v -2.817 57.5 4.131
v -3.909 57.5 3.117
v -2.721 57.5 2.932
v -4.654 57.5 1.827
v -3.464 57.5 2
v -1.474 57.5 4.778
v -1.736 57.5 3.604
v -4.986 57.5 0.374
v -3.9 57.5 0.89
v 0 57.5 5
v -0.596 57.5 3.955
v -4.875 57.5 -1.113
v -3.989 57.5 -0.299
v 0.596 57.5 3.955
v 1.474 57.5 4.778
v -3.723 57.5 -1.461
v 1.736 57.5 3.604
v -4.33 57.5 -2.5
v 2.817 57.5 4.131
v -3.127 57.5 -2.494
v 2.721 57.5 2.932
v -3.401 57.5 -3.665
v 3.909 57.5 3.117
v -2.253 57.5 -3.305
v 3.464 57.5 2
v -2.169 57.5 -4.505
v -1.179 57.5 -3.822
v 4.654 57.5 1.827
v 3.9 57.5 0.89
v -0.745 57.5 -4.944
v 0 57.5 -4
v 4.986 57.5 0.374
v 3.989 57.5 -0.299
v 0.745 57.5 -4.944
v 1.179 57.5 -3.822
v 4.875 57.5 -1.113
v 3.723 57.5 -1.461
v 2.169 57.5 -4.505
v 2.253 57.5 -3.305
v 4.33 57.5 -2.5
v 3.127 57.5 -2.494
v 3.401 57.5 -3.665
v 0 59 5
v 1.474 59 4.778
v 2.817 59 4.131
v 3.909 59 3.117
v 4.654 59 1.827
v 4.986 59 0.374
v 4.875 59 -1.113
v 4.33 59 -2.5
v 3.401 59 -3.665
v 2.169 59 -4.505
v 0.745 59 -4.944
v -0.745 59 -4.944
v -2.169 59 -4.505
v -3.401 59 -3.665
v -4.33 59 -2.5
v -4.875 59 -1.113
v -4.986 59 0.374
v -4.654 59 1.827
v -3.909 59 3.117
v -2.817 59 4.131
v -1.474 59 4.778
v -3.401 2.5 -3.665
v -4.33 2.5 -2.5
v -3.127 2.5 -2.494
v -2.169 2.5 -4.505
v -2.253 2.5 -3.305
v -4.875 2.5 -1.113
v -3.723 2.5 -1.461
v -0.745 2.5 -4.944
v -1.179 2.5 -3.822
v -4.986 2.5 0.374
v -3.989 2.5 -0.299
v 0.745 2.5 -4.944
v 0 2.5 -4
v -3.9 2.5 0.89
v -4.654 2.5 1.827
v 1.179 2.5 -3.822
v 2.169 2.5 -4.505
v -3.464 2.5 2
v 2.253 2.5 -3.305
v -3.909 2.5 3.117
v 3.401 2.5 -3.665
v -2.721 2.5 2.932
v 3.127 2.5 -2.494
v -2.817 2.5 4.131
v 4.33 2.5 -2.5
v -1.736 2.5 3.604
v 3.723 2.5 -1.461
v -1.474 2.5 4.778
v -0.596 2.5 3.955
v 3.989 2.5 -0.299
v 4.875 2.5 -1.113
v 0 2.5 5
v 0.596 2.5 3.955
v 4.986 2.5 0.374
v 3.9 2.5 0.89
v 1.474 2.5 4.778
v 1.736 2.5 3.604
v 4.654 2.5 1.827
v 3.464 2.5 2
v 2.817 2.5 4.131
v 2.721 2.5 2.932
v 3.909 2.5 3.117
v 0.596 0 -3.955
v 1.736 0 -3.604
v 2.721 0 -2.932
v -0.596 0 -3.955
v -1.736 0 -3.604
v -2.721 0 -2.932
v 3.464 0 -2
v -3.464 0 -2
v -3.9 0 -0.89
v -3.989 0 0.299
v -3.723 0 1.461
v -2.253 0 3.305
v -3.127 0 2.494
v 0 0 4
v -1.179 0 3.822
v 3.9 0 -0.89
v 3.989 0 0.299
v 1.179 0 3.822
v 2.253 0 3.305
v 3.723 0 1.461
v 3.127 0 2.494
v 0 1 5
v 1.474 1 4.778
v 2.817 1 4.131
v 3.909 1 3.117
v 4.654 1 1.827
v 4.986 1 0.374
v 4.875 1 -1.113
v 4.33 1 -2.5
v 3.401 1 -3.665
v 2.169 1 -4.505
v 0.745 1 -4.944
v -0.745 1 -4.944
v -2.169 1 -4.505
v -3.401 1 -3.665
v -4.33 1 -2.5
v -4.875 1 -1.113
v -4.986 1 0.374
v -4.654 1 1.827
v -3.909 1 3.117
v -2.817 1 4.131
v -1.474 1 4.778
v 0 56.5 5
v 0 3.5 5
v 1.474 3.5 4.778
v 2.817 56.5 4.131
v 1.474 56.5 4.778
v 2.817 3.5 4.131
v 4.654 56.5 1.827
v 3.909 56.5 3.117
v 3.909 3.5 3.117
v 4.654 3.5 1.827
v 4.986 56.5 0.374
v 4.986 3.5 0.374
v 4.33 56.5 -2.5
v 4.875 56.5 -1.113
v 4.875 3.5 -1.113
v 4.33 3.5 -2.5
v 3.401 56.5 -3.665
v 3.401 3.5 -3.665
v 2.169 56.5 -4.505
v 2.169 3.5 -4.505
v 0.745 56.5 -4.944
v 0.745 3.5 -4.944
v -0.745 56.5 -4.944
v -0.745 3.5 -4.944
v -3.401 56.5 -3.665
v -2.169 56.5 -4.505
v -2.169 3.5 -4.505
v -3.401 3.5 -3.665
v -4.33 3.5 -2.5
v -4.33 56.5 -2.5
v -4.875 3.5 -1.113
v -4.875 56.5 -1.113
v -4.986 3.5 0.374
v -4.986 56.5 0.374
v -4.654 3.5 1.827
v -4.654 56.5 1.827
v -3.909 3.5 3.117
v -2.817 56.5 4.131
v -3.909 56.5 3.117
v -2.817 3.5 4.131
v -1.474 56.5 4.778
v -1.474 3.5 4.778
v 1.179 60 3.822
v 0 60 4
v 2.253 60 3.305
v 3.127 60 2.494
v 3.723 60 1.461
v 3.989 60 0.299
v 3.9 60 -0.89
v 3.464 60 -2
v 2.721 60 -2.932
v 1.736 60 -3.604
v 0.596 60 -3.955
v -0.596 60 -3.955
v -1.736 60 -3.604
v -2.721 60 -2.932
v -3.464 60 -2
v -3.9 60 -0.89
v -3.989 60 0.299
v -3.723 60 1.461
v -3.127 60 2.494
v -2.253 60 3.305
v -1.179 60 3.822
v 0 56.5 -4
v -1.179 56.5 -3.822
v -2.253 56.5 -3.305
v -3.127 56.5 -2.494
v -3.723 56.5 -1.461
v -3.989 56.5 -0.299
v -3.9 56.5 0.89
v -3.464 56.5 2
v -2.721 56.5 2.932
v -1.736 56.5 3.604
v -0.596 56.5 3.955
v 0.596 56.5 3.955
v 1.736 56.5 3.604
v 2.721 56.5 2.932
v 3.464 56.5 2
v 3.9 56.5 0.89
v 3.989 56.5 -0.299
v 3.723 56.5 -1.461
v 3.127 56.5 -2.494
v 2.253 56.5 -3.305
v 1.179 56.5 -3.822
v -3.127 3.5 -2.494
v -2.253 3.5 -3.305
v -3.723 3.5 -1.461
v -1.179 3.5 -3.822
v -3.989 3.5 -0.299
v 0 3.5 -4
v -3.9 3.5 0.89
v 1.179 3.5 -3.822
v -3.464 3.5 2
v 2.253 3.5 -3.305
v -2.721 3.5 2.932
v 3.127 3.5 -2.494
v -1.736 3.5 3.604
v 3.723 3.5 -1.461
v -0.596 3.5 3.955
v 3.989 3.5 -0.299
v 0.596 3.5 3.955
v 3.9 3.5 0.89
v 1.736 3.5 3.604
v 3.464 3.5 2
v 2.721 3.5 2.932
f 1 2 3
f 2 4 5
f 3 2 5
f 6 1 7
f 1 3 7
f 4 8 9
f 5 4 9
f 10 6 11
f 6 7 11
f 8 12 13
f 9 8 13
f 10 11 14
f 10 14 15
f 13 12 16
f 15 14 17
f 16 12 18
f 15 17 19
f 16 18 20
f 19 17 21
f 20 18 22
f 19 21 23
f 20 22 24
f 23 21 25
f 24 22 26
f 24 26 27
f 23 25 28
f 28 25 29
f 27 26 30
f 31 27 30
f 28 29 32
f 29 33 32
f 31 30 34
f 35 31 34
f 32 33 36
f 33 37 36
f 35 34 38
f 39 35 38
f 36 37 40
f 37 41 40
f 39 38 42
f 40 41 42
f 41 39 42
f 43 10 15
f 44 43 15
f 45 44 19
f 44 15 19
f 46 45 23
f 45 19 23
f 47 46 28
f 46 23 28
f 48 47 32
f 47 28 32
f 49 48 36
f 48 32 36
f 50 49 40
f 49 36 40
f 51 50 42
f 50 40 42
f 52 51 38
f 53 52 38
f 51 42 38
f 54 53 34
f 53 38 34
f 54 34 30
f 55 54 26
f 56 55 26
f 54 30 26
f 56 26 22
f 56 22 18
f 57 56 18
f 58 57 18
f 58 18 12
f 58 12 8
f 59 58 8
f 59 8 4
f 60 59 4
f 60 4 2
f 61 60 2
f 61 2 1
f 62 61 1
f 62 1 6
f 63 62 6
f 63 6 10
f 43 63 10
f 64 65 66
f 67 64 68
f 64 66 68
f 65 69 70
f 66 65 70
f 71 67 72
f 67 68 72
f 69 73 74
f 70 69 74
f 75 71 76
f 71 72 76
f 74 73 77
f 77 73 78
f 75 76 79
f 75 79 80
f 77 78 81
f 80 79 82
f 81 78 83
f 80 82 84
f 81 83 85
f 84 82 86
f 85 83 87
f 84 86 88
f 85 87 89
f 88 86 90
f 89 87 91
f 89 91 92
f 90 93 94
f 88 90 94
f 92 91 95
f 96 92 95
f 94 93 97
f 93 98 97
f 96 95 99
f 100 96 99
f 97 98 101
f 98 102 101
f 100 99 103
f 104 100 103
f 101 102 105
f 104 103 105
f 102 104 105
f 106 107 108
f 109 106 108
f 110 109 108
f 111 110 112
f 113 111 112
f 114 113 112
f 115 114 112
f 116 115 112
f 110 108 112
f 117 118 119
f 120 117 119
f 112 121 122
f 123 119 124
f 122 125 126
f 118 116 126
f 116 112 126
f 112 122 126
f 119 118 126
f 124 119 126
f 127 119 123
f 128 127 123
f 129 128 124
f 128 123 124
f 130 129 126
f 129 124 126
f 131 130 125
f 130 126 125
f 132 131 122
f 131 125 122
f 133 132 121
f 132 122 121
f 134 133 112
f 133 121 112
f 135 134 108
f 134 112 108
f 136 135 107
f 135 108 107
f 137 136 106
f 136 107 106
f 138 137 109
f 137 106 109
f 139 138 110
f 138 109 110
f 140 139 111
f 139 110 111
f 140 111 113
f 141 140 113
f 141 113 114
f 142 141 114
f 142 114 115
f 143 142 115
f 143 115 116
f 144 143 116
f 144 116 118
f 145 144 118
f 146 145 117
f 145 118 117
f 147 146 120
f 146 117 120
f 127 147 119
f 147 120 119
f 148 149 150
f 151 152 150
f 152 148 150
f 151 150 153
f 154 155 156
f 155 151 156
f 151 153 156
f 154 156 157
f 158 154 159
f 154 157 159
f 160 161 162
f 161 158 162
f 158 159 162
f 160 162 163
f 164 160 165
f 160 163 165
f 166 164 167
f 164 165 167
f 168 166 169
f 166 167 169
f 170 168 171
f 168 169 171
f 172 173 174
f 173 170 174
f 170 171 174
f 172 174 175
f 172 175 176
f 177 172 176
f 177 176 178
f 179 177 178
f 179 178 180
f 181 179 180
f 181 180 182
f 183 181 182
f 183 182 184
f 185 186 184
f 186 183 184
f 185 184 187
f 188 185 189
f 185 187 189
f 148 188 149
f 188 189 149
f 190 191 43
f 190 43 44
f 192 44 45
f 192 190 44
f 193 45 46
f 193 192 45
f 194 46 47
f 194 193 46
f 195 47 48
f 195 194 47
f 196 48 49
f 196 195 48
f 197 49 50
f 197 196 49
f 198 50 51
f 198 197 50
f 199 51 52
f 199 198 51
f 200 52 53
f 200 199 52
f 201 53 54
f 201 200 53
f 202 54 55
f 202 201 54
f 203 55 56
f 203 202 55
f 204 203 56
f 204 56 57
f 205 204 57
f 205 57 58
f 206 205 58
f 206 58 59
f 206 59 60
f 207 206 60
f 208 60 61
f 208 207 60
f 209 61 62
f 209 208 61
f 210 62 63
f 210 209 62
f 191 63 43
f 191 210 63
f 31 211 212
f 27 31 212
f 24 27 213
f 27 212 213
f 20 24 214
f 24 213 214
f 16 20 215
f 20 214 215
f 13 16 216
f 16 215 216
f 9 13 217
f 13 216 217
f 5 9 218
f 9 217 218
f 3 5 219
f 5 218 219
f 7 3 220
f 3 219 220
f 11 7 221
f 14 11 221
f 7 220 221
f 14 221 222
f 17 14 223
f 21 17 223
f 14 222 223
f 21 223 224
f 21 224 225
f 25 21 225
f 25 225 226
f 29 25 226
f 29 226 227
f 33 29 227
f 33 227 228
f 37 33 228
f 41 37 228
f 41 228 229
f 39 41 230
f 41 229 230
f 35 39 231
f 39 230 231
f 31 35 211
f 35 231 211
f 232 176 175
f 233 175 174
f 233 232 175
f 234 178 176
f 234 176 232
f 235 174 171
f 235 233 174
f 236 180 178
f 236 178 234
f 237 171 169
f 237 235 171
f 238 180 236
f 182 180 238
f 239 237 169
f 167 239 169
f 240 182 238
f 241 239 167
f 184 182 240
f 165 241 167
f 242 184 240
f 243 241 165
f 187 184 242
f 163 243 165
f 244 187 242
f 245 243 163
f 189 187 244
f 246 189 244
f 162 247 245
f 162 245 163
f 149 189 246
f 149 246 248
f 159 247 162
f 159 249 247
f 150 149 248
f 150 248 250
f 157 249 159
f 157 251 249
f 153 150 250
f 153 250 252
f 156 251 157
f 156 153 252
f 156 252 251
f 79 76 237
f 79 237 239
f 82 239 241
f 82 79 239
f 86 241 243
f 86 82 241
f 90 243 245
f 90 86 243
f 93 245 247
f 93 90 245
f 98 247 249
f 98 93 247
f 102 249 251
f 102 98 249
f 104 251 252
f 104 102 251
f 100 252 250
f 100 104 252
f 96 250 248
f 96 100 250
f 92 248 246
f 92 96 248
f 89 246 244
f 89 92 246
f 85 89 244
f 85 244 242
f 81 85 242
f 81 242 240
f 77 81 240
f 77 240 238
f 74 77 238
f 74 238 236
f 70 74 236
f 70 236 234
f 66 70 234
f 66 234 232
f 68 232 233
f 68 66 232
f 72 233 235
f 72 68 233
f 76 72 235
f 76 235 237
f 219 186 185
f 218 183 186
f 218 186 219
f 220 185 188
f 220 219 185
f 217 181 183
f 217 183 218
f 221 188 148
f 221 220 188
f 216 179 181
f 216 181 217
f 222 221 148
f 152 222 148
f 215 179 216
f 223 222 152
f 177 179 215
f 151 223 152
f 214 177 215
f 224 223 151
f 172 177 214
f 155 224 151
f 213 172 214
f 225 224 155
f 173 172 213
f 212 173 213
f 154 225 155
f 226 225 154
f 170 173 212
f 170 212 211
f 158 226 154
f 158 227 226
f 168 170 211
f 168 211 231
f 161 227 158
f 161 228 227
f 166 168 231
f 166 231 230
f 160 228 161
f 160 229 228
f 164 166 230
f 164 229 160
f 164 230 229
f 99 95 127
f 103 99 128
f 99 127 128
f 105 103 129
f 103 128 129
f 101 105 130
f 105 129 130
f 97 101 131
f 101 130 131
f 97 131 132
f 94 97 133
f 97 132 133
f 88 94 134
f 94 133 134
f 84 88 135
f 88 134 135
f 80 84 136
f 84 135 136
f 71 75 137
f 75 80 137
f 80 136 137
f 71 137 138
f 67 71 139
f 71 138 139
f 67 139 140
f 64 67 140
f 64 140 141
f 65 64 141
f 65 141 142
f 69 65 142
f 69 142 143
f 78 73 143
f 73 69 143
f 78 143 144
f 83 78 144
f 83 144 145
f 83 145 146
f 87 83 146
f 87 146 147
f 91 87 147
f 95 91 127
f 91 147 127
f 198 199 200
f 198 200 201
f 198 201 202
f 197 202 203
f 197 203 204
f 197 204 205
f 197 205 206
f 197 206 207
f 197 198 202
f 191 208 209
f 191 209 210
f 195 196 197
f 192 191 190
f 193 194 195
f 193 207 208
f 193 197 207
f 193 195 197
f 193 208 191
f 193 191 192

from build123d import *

# Parameters (mm, degrees)
SKETCH1_R           = 5
BOSS_EXTRUDE1_DEPTH = 60
CHAMFER1_SIZE       = 1
CUT_EXTRUDE1_START  = -2.5
SKETCH2_R           = 7.5
SKETCH2_R_2         = 4
CUT_EXTRUDE1_DEPTH  = 1
CUT_EXTRUDE2_START  = -3.5
SKETCH3_R           = 7.5
SKETCH3_R_2         = 4
CUT_EXTRUDE2_DEPTH  = 1


with BuildPart() as part:
    # Sketch1 → Boss-Extrude1 (new body)
    with BuildSketch(Plane(origin=(0, 0, 0), x_dir=(1, 0, 0), z_dir=(0, 1, 0))):
        with Locations(Location((0, 0, 0), (0, 0, 270))):
            Circle(SKETCH1_R)
    extrude(amount=BOSS_EXTRUDE1_DEPTH)

    # Chamfer1
    chamfer1_edges = [part.edges().sort_by_distance(p)[0] for p in [
        (0, 0, -5),
        (0, 60, -5),
    ]]
    chamfer(chamfer1_edges, length=CHAMFER1_SIZE)

    # Sketch2 → Cut-Extrude1 (cut)
    with BuildSketch(Plane.XZ.offset(CUT_EXTRUDE1_START)):
        Circle(SKETCH2_R)
        with Locations(Location((0, 0, 0), (0, 0, 270))):
            Circle(SKETCH2_R_2, mode=Mode.SUBTRACT)
    extrude(amount=-CUT_EXTRUDE1_DEPTH, mode=Mode.SUBTRACT)

    # Sketch3 → Cut-Extrude2 (cut)
    with BuildSketch(Plane(origin=(0, 60, 0), x_dir=(1, 0, 0), z_dir=(0, 1, 0)).offset(CUT_EXTRUDE2_START)):
        Circle(SKETCH3_R)
        with Locations(Location((0, 0, 0), (0, 0, 90))):
            Circle(SKETCH3_R_2, mode=Mode.SUBTRACT)
    extrude(amount=CUT_EXTRUDE2_DEPTH, mode=Mode.SUBTRACT)


solid = part.part
